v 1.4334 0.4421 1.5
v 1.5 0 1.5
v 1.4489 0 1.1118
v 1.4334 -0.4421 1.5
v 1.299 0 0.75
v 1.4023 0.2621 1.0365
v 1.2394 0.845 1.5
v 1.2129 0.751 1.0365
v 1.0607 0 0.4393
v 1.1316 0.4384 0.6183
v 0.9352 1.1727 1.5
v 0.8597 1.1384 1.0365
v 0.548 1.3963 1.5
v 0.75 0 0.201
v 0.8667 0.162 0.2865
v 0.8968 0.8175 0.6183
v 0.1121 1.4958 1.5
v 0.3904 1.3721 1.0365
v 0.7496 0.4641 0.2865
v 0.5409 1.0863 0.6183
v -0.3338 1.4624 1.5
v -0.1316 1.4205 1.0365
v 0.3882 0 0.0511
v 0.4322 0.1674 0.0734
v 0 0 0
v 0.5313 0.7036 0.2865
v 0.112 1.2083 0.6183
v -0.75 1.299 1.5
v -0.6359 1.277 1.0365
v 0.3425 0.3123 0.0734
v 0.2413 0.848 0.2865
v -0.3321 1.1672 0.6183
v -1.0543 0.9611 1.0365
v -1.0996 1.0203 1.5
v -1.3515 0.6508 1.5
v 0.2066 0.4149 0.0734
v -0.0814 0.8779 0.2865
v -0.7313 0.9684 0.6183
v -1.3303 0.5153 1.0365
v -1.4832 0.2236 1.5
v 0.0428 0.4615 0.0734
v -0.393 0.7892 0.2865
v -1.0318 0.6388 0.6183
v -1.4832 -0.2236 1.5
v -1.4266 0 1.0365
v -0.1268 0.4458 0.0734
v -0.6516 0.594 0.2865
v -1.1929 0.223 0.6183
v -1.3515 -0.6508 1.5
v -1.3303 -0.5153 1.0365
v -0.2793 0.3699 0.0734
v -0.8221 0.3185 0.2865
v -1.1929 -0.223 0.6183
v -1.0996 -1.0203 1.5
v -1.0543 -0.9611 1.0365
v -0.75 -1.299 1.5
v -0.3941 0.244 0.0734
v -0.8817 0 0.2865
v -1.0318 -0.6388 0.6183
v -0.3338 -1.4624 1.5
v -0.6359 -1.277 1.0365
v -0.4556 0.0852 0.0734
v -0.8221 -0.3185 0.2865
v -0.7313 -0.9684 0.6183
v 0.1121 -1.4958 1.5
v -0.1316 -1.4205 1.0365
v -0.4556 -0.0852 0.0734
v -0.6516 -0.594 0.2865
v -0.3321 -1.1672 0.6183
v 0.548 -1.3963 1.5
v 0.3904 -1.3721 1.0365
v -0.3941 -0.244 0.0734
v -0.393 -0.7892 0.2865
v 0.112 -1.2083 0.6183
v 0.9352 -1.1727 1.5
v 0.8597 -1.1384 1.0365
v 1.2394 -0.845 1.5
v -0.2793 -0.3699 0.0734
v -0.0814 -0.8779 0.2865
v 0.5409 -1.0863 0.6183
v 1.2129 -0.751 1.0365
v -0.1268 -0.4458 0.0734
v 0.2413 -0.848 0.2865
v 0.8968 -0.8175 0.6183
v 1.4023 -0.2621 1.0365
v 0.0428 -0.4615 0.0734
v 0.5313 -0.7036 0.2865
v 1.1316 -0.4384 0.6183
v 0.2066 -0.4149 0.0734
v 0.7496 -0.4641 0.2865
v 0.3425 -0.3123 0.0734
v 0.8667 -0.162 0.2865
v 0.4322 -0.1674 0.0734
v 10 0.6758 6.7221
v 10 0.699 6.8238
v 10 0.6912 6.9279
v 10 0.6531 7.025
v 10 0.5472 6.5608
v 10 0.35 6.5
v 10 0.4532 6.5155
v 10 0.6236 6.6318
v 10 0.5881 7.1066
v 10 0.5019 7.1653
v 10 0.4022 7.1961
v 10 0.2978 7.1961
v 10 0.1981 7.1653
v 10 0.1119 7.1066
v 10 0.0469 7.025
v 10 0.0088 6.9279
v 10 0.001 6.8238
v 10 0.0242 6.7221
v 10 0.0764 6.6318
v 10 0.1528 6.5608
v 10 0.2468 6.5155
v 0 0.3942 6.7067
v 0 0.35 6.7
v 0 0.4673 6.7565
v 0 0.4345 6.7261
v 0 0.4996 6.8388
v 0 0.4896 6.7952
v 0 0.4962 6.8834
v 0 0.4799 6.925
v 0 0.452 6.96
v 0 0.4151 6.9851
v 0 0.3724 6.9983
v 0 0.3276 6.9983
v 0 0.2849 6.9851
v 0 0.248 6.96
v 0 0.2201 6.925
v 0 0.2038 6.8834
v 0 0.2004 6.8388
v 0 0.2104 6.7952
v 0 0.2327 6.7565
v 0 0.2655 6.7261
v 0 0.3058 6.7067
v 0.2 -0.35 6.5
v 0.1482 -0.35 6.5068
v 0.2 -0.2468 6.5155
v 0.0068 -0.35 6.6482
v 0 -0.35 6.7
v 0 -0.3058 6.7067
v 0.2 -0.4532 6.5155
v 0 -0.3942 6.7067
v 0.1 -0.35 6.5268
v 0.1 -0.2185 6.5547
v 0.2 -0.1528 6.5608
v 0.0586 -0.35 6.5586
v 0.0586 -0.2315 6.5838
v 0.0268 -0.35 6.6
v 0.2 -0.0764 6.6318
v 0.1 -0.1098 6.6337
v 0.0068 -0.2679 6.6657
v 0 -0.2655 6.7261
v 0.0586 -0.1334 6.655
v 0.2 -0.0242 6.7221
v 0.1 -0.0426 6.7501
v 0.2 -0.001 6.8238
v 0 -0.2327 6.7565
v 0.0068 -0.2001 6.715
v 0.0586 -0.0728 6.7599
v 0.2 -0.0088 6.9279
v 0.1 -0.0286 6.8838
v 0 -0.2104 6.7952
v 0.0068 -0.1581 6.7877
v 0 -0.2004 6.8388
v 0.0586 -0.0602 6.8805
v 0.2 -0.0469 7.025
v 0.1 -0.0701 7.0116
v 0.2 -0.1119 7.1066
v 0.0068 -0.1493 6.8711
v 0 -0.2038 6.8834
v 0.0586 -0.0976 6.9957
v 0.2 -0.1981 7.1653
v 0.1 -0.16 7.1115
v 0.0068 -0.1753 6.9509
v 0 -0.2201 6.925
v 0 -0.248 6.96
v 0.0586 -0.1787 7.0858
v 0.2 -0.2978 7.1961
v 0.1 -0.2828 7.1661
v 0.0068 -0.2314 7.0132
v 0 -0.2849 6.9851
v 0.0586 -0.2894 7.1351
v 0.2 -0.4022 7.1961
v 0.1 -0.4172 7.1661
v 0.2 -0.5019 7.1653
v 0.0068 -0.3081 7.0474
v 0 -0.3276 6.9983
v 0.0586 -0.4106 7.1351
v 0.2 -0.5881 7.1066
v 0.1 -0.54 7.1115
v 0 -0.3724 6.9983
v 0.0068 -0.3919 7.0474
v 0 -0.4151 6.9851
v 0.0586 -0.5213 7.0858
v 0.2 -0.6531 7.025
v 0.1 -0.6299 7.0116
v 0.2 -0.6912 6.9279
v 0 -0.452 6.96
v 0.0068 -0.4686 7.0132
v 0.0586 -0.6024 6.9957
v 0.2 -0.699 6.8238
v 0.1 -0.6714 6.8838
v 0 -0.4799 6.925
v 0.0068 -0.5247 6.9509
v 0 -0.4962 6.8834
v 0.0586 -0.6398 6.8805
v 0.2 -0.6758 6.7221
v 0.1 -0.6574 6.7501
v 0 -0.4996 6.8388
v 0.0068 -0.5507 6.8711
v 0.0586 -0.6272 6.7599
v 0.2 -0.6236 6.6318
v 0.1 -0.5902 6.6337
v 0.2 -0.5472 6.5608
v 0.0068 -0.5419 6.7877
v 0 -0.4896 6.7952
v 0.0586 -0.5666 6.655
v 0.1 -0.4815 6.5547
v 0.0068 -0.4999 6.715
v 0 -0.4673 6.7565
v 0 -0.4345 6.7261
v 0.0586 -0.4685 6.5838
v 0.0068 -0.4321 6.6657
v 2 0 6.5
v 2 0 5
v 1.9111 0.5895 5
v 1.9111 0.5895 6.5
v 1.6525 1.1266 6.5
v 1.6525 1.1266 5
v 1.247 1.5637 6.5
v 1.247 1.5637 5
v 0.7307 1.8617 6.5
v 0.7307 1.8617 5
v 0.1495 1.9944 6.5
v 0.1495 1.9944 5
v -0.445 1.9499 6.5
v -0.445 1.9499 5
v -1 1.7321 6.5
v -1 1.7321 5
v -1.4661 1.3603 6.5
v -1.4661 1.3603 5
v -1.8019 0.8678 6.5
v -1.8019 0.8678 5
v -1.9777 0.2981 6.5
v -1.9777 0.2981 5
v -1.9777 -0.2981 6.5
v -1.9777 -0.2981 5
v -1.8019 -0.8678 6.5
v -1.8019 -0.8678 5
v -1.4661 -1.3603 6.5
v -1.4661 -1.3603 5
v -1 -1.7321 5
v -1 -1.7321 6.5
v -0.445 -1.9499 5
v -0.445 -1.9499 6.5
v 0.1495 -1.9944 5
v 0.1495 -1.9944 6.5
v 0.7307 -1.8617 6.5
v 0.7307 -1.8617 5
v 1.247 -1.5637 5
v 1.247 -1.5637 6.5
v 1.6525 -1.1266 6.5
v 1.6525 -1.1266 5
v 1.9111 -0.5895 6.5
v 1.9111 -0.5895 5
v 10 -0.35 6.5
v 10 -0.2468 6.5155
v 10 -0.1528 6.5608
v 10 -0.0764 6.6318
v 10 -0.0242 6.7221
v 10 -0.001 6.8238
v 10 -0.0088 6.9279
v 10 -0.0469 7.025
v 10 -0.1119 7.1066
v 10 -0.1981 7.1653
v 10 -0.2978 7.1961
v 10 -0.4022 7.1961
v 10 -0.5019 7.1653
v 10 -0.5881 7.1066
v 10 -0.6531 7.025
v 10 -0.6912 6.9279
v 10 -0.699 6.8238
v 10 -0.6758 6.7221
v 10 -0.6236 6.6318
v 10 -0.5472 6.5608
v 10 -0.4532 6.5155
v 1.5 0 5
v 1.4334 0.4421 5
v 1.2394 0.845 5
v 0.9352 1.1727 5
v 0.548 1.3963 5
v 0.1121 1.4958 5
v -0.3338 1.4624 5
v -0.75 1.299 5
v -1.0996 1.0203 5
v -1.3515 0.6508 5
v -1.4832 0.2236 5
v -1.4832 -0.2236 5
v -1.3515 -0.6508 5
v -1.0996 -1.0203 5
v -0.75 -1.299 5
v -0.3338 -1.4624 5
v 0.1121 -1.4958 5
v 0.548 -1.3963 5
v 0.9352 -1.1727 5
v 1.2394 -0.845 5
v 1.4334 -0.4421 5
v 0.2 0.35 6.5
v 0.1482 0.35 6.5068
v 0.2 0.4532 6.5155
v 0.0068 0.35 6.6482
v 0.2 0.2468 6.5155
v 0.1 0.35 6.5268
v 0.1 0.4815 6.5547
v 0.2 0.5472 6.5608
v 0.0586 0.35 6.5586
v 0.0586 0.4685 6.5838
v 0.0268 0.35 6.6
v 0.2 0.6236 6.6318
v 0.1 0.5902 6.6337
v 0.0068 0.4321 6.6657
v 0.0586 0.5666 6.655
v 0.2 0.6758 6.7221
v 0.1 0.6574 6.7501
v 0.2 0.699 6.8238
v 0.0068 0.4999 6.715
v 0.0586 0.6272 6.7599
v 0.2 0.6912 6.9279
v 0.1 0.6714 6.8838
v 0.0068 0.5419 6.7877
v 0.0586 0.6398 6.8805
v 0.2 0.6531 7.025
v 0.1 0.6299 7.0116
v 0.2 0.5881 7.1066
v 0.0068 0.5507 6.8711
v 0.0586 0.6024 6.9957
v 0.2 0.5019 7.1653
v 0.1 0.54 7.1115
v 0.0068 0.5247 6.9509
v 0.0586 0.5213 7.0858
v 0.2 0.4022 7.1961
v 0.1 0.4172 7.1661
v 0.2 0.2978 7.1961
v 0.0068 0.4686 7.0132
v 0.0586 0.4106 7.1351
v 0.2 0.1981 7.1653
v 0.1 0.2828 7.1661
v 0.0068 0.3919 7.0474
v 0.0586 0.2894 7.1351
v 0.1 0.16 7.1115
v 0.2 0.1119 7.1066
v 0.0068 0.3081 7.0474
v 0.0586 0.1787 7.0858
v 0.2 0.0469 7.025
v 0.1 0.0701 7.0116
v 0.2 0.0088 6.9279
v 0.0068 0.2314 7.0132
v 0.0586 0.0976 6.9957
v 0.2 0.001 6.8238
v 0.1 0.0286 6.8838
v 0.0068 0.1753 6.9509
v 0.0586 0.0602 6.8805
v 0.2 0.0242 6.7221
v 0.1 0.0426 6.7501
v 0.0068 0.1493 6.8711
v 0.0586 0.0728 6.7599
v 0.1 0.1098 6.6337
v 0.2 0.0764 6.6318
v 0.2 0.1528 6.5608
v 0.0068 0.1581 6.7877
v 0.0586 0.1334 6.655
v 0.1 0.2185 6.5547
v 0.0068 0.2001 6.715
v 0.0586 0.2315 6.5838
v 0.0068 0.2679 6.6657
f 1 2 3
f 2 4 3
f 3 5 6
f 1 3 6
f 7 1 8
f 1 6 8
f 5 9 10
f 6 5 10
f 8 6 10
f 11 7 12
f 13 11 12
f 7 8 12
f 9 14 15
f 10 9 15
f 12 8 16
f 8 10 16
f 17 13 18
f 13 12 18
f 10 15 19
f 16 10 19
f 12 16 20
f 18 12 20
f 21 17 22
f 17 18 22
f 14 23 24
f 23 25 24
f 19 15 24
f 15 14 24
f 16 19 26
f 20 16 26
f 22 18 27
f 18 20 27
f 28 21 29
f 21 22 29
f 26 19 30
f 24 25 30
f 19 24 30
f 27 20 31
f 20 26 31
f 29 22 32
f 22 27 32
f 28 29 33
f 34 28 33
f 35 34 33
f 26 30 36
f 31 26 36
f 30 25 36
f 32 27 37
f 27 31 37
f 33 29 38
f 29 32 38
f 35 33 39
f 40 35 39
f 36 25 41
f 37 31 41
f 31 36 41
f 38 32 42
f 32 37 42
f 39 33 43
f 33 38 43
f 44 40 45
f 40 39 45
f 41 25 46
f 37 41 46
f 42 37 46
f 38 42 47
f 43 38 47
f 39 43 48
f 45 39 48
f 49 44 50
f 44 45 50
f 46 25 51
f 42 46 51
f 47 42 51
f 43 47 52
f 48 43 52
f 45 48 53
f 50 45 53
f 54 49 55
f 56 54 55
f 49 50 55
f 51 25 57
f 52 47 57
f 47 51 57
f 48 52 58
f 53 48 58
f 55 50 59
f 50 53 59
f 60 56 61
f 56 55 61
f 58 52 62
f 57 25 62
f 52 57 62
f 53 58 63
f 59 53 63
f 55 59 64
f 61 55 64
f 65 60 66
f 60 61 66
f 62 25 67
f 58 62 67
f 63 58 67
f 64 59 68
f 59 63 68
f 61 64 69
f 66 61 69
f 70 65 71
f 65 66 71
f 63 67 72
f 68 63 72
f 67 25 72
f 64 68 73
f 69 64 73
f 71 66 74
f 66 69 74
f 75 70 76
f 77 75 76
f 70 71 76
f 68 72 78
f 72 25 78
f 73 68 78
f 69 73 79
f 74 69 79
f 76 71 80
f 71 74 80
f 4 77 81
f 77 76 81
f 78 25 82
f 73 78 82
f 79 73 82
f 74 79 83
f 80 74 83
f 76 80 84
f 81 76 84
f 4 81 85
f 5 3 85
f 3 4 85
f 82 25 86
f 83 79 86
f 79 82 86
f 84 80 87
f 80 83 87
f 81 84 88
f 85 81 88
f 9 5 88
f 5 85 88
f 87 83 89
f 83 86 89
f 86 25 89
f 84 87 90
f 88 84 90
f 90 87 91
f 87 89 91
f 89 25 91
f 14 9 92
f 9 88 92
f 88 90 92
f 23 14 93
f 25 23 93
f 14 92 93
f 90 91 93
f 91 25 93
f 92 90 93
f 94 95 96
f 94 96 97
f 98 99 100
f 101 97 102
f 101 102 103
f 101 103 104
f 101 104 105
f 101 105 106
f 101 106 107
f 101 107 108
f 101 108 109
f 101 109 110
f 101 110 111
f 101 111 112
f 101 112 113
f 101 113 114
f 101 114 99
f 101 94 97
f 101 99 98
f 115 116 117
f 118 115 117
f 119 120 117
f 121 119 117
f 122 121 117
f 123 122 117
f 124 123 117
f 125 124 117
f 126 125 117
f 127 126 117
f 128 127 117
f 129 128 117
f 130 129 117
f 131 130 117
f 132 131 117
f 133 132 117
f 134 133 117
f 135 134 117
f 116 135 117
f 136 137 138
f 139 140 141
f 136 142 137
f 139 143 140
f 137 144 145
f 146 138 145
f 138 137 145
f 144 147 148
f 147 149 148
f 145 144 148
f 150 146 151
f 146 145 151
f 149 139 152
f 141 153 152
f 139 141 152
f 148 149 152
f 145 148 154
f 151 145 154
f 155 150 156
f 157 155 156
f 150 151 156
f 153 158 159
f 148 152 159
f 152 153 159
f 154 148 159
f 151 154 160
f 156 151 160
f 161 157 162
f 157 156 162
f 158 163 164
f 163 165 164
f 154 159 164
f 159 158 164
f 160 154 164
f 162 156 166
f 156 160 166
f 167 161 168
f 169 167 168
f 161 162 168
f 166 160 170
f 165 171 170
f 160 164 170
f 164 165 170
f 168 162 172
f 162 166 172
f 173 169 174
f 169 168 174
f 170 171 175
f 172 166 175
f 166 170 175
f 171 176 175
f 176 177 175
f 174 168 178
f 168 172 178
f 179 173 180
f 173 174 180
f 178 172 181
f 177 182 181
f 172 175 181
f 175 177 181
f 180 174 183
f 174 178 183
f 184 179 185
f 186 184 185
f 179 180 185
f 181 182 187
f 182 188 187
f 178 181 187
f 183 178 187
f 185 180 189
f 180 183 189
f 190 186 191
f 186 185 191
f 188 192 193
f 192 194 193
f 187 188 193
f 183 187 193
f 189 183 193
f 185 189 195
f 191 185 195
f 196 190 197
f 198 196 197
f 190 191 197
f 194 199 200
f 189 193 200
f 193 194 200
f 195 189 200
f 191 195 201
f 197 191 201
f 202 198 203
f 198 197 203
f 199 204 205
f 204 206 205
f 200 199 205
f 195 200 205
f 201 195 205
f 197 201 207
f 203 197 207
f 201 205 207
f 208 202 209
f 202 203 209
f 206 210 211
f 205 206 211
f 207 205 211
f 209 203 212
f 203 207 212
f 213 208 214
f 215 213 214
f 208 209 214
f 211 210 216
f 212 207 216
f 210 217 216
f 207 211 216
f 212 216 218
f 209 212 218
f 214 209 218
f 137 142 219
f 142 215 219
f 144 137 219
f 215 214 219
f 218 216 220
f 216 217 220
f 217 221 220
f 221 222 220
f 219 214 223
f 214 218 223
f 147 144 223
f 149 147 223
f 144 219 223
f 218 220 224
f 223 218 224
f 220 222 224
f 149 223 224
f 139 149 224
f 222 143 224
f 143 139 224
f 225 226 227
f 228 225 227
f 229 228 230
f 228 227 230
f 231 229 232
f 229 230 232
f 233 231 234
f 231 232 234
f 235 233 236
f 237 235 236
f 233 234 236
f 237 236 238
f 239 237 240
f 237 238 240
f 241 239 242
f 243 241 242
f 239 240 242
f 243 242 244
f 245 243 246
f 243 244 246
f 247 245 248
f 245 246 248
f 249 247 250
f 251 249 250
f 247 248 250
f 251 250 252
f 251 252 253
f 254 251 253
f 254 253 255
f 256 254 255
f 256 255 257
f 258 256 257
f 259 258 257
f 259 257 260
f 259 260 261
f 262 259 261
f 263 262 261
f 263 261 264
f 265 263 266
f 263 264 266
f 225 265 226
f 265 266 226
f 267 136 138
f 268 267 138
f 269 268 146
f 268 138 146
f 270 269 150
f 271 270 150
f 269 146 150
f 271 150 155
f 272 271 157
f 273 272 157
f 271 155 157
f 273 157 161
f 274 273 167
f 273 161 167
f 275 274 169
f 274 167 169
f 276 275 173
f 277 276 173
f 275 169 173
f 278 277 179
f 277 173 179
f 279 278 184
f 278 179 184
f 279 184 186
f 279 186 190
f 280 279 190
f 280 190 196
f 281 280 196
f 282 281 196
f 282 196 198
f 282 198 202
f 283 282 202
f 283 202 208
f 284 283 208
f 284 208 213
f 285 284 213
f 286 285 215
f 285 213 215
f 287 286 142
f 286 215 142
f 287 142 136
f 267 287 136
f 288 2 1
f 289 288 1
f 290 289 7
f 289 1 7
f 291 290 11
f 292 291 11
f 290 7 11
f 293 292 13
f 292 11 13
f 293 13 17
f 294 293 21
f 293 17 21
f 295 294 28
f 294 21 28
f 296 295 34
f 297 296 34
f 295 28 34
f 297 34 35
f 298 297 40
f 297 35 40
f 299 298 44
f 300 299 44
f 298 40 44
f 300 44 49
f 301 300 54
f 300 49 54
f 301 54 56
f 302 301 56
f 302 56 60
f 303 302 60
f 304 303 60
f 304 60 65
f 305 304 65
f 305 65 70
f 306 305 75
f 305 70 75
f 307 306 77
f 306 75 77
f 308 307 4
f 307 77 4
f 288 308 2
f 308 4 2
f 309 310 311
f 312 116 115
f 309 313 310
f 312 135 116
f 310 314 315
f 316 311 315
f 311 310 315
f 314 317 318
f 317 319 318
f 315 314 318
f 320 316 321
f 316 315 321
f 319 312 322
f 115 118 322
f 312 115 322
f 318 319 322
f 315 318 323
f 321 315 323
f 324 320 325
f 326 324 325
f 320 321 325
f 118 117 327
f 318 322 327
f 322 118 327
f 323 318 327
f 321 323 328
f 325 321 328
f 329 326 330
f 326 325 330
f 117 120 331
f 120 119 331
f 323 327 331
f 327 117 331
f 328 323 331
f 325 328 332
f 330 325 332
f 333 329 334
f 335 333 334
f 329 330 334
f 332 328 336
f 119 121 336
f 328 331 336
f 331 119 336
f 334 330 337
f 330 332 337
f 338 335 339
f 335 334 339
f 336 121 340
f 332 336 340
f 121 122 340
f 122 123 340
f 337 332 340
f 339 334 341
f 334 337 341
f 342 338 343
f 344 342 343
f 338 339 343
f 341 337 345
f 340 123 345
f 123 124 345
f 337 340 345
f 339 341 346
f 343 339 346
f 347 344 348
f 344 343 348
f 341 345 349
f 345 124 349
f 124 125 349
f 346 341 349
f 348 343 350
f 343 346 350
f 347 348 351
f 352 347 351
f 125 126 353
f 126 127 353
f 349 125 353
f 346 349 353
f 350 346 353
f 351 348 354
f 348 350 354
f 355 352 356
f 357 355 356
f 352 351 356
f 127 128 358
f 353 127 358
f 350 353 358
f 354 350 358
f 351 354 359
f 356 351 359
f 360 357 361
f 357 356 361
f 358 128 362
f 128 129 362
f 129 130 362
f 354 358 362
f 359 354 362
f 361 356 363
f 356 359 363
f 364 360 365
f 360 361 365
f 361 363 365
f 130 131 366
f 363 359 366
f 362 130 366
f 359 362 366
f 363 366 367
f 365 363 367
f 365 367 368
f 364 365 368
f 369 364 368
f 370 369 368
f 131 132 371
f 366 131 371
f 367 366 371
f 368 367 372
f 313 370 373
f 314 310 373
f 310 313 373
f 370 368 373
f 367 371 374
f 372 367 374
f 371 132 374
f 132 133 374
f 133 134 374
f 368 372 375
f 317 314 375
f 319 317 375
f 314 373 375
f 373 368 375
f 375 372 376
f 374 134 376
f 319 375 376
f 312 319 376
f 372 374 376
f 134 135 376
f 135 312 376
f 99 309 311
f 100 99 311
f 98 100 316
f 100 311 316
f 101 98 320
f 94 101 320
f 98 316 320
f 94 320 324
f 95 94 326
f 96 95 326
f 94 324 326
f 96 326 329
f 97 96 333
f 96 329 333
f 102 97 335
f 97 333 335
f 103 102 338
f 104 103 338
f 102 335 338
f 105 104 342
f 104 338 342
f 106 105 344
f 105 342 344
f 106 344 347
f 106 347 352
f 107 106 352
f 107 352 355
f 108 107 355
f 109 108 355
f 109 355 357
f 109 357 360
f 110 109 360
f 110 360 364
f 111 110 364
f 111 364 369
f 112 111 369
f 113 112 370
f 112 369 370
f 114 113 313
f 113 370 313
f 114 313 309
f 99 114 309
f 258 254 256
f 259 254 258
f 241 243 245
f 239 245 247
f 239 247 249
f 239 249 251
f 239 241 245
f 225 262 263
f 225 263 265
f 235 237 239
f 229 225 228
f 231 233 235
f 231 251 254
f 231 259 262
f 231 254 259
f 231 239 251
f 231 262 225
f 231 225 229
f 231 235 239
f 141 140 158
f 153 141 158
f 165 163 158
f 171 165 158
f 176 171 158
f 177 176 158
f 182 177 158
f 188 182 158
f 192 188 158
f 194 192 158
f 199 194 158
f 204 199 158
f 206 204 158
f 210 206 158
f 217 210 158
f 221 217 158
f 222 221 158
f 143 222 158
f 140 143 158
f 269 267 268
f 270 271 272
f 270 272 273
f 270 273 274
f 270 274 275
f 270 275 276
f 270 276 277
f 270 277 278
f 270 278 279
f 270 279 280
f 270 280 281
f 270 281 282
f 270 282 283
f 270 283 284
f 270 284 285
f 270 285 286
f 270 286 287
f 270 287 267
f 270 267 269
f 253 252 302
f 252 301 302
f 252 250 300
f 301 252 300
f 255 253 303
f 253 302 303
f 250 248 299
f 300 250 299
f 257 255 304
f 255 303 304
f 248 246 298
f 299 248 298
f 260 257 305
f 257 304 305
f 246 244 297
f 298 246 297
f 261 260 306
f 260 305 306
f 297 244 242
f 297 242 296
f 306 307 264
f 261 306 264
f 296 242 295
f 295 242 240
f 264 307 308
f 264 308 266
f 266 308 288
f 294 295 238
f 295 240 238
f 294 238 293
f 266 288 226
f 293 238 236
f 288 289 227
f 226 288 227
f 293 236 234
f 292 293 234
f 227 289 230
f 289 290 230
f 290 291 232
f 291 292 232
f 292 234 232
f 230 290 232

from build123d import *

# Parameters (mm, degrees)
SKETCH1_R        = 1.5
EXTRUDE1_DEPTH   = 5
SKETCH2_R        = 2
EXTRUDE2_DEPTH   = 1.5
FILLET1_R        = 1.5
SKETCH3_R        = 0.35
EXTRUDE3_DEPTH   = 10
EXTRUDE3_2_DEPTH = 10
FILLET2_R        = 0.2
FILLET3_R        = 0.2


with BuildPart() as part:
    # Sketch1 → Extrude1 (new body)
    with BuildSketch(Plane.XY):
        Circle(SKETCH1_R)
    extrude(amount=EXTRUDE1_DEPTH)

    # Sketch2 → Extrude2 (add)
    with BuildSketch(Plane.XY.offset(5)):
        Circle(SKETCH2_R)
    extrude(amount=EXTRUDE2_DEPTH)

    # Fillet1
    fillet1_edges = [part.edges().sort_by_distance(p)[0] for p in [
        (-1.5, 0, 0),
    ]]
    fillet(fillet1_edges, radius=FILLET1_R)


with BuildPart() as body_2:
    # Sketch3 → Extrude3 (new body)
    with BuildSketch(Plane(origin=(0, 0, 0), x_dir=(0, 0, -1), z_dir=(1, 0, 0))):
        with Locations((-6.85, -0.35)):
            Circle(SKETCH3_R)
    extrude(amount=EXTRUDE3_DEPTH)

    # Fillet2
    fillet2_edges = [body_2.edges().sort_by_distance(p)[0] for p in [
        (0, -0.35, 7.2),
    ]]
    fillet(fillet2_edges, radius=FILLET2_R)


with BuildPart() as body_3:
    # Sketch3 → Extrude3 2 (new body)
    with BuildSketch(Plane(origin=(0, 0, 0), x_dir=(0, 0, -1), z_dir=(1, 0, 0))):
        with Locations((-6.85, 0.35)):
            Circle(SKETCH3_R)
    extrude(amount=EXTRUDE3_2_DEPTH)

    # Fillet3
    fillet3_edges = [body_3.edges().sort_by_distance(p)[0] for p in [
        (0, 0.35, 7.2),
    ]]
    fillet(fillet3_edges, radius=FILLET3_R)


solid = Compound([part.part, body_2.part, body_3.part])
